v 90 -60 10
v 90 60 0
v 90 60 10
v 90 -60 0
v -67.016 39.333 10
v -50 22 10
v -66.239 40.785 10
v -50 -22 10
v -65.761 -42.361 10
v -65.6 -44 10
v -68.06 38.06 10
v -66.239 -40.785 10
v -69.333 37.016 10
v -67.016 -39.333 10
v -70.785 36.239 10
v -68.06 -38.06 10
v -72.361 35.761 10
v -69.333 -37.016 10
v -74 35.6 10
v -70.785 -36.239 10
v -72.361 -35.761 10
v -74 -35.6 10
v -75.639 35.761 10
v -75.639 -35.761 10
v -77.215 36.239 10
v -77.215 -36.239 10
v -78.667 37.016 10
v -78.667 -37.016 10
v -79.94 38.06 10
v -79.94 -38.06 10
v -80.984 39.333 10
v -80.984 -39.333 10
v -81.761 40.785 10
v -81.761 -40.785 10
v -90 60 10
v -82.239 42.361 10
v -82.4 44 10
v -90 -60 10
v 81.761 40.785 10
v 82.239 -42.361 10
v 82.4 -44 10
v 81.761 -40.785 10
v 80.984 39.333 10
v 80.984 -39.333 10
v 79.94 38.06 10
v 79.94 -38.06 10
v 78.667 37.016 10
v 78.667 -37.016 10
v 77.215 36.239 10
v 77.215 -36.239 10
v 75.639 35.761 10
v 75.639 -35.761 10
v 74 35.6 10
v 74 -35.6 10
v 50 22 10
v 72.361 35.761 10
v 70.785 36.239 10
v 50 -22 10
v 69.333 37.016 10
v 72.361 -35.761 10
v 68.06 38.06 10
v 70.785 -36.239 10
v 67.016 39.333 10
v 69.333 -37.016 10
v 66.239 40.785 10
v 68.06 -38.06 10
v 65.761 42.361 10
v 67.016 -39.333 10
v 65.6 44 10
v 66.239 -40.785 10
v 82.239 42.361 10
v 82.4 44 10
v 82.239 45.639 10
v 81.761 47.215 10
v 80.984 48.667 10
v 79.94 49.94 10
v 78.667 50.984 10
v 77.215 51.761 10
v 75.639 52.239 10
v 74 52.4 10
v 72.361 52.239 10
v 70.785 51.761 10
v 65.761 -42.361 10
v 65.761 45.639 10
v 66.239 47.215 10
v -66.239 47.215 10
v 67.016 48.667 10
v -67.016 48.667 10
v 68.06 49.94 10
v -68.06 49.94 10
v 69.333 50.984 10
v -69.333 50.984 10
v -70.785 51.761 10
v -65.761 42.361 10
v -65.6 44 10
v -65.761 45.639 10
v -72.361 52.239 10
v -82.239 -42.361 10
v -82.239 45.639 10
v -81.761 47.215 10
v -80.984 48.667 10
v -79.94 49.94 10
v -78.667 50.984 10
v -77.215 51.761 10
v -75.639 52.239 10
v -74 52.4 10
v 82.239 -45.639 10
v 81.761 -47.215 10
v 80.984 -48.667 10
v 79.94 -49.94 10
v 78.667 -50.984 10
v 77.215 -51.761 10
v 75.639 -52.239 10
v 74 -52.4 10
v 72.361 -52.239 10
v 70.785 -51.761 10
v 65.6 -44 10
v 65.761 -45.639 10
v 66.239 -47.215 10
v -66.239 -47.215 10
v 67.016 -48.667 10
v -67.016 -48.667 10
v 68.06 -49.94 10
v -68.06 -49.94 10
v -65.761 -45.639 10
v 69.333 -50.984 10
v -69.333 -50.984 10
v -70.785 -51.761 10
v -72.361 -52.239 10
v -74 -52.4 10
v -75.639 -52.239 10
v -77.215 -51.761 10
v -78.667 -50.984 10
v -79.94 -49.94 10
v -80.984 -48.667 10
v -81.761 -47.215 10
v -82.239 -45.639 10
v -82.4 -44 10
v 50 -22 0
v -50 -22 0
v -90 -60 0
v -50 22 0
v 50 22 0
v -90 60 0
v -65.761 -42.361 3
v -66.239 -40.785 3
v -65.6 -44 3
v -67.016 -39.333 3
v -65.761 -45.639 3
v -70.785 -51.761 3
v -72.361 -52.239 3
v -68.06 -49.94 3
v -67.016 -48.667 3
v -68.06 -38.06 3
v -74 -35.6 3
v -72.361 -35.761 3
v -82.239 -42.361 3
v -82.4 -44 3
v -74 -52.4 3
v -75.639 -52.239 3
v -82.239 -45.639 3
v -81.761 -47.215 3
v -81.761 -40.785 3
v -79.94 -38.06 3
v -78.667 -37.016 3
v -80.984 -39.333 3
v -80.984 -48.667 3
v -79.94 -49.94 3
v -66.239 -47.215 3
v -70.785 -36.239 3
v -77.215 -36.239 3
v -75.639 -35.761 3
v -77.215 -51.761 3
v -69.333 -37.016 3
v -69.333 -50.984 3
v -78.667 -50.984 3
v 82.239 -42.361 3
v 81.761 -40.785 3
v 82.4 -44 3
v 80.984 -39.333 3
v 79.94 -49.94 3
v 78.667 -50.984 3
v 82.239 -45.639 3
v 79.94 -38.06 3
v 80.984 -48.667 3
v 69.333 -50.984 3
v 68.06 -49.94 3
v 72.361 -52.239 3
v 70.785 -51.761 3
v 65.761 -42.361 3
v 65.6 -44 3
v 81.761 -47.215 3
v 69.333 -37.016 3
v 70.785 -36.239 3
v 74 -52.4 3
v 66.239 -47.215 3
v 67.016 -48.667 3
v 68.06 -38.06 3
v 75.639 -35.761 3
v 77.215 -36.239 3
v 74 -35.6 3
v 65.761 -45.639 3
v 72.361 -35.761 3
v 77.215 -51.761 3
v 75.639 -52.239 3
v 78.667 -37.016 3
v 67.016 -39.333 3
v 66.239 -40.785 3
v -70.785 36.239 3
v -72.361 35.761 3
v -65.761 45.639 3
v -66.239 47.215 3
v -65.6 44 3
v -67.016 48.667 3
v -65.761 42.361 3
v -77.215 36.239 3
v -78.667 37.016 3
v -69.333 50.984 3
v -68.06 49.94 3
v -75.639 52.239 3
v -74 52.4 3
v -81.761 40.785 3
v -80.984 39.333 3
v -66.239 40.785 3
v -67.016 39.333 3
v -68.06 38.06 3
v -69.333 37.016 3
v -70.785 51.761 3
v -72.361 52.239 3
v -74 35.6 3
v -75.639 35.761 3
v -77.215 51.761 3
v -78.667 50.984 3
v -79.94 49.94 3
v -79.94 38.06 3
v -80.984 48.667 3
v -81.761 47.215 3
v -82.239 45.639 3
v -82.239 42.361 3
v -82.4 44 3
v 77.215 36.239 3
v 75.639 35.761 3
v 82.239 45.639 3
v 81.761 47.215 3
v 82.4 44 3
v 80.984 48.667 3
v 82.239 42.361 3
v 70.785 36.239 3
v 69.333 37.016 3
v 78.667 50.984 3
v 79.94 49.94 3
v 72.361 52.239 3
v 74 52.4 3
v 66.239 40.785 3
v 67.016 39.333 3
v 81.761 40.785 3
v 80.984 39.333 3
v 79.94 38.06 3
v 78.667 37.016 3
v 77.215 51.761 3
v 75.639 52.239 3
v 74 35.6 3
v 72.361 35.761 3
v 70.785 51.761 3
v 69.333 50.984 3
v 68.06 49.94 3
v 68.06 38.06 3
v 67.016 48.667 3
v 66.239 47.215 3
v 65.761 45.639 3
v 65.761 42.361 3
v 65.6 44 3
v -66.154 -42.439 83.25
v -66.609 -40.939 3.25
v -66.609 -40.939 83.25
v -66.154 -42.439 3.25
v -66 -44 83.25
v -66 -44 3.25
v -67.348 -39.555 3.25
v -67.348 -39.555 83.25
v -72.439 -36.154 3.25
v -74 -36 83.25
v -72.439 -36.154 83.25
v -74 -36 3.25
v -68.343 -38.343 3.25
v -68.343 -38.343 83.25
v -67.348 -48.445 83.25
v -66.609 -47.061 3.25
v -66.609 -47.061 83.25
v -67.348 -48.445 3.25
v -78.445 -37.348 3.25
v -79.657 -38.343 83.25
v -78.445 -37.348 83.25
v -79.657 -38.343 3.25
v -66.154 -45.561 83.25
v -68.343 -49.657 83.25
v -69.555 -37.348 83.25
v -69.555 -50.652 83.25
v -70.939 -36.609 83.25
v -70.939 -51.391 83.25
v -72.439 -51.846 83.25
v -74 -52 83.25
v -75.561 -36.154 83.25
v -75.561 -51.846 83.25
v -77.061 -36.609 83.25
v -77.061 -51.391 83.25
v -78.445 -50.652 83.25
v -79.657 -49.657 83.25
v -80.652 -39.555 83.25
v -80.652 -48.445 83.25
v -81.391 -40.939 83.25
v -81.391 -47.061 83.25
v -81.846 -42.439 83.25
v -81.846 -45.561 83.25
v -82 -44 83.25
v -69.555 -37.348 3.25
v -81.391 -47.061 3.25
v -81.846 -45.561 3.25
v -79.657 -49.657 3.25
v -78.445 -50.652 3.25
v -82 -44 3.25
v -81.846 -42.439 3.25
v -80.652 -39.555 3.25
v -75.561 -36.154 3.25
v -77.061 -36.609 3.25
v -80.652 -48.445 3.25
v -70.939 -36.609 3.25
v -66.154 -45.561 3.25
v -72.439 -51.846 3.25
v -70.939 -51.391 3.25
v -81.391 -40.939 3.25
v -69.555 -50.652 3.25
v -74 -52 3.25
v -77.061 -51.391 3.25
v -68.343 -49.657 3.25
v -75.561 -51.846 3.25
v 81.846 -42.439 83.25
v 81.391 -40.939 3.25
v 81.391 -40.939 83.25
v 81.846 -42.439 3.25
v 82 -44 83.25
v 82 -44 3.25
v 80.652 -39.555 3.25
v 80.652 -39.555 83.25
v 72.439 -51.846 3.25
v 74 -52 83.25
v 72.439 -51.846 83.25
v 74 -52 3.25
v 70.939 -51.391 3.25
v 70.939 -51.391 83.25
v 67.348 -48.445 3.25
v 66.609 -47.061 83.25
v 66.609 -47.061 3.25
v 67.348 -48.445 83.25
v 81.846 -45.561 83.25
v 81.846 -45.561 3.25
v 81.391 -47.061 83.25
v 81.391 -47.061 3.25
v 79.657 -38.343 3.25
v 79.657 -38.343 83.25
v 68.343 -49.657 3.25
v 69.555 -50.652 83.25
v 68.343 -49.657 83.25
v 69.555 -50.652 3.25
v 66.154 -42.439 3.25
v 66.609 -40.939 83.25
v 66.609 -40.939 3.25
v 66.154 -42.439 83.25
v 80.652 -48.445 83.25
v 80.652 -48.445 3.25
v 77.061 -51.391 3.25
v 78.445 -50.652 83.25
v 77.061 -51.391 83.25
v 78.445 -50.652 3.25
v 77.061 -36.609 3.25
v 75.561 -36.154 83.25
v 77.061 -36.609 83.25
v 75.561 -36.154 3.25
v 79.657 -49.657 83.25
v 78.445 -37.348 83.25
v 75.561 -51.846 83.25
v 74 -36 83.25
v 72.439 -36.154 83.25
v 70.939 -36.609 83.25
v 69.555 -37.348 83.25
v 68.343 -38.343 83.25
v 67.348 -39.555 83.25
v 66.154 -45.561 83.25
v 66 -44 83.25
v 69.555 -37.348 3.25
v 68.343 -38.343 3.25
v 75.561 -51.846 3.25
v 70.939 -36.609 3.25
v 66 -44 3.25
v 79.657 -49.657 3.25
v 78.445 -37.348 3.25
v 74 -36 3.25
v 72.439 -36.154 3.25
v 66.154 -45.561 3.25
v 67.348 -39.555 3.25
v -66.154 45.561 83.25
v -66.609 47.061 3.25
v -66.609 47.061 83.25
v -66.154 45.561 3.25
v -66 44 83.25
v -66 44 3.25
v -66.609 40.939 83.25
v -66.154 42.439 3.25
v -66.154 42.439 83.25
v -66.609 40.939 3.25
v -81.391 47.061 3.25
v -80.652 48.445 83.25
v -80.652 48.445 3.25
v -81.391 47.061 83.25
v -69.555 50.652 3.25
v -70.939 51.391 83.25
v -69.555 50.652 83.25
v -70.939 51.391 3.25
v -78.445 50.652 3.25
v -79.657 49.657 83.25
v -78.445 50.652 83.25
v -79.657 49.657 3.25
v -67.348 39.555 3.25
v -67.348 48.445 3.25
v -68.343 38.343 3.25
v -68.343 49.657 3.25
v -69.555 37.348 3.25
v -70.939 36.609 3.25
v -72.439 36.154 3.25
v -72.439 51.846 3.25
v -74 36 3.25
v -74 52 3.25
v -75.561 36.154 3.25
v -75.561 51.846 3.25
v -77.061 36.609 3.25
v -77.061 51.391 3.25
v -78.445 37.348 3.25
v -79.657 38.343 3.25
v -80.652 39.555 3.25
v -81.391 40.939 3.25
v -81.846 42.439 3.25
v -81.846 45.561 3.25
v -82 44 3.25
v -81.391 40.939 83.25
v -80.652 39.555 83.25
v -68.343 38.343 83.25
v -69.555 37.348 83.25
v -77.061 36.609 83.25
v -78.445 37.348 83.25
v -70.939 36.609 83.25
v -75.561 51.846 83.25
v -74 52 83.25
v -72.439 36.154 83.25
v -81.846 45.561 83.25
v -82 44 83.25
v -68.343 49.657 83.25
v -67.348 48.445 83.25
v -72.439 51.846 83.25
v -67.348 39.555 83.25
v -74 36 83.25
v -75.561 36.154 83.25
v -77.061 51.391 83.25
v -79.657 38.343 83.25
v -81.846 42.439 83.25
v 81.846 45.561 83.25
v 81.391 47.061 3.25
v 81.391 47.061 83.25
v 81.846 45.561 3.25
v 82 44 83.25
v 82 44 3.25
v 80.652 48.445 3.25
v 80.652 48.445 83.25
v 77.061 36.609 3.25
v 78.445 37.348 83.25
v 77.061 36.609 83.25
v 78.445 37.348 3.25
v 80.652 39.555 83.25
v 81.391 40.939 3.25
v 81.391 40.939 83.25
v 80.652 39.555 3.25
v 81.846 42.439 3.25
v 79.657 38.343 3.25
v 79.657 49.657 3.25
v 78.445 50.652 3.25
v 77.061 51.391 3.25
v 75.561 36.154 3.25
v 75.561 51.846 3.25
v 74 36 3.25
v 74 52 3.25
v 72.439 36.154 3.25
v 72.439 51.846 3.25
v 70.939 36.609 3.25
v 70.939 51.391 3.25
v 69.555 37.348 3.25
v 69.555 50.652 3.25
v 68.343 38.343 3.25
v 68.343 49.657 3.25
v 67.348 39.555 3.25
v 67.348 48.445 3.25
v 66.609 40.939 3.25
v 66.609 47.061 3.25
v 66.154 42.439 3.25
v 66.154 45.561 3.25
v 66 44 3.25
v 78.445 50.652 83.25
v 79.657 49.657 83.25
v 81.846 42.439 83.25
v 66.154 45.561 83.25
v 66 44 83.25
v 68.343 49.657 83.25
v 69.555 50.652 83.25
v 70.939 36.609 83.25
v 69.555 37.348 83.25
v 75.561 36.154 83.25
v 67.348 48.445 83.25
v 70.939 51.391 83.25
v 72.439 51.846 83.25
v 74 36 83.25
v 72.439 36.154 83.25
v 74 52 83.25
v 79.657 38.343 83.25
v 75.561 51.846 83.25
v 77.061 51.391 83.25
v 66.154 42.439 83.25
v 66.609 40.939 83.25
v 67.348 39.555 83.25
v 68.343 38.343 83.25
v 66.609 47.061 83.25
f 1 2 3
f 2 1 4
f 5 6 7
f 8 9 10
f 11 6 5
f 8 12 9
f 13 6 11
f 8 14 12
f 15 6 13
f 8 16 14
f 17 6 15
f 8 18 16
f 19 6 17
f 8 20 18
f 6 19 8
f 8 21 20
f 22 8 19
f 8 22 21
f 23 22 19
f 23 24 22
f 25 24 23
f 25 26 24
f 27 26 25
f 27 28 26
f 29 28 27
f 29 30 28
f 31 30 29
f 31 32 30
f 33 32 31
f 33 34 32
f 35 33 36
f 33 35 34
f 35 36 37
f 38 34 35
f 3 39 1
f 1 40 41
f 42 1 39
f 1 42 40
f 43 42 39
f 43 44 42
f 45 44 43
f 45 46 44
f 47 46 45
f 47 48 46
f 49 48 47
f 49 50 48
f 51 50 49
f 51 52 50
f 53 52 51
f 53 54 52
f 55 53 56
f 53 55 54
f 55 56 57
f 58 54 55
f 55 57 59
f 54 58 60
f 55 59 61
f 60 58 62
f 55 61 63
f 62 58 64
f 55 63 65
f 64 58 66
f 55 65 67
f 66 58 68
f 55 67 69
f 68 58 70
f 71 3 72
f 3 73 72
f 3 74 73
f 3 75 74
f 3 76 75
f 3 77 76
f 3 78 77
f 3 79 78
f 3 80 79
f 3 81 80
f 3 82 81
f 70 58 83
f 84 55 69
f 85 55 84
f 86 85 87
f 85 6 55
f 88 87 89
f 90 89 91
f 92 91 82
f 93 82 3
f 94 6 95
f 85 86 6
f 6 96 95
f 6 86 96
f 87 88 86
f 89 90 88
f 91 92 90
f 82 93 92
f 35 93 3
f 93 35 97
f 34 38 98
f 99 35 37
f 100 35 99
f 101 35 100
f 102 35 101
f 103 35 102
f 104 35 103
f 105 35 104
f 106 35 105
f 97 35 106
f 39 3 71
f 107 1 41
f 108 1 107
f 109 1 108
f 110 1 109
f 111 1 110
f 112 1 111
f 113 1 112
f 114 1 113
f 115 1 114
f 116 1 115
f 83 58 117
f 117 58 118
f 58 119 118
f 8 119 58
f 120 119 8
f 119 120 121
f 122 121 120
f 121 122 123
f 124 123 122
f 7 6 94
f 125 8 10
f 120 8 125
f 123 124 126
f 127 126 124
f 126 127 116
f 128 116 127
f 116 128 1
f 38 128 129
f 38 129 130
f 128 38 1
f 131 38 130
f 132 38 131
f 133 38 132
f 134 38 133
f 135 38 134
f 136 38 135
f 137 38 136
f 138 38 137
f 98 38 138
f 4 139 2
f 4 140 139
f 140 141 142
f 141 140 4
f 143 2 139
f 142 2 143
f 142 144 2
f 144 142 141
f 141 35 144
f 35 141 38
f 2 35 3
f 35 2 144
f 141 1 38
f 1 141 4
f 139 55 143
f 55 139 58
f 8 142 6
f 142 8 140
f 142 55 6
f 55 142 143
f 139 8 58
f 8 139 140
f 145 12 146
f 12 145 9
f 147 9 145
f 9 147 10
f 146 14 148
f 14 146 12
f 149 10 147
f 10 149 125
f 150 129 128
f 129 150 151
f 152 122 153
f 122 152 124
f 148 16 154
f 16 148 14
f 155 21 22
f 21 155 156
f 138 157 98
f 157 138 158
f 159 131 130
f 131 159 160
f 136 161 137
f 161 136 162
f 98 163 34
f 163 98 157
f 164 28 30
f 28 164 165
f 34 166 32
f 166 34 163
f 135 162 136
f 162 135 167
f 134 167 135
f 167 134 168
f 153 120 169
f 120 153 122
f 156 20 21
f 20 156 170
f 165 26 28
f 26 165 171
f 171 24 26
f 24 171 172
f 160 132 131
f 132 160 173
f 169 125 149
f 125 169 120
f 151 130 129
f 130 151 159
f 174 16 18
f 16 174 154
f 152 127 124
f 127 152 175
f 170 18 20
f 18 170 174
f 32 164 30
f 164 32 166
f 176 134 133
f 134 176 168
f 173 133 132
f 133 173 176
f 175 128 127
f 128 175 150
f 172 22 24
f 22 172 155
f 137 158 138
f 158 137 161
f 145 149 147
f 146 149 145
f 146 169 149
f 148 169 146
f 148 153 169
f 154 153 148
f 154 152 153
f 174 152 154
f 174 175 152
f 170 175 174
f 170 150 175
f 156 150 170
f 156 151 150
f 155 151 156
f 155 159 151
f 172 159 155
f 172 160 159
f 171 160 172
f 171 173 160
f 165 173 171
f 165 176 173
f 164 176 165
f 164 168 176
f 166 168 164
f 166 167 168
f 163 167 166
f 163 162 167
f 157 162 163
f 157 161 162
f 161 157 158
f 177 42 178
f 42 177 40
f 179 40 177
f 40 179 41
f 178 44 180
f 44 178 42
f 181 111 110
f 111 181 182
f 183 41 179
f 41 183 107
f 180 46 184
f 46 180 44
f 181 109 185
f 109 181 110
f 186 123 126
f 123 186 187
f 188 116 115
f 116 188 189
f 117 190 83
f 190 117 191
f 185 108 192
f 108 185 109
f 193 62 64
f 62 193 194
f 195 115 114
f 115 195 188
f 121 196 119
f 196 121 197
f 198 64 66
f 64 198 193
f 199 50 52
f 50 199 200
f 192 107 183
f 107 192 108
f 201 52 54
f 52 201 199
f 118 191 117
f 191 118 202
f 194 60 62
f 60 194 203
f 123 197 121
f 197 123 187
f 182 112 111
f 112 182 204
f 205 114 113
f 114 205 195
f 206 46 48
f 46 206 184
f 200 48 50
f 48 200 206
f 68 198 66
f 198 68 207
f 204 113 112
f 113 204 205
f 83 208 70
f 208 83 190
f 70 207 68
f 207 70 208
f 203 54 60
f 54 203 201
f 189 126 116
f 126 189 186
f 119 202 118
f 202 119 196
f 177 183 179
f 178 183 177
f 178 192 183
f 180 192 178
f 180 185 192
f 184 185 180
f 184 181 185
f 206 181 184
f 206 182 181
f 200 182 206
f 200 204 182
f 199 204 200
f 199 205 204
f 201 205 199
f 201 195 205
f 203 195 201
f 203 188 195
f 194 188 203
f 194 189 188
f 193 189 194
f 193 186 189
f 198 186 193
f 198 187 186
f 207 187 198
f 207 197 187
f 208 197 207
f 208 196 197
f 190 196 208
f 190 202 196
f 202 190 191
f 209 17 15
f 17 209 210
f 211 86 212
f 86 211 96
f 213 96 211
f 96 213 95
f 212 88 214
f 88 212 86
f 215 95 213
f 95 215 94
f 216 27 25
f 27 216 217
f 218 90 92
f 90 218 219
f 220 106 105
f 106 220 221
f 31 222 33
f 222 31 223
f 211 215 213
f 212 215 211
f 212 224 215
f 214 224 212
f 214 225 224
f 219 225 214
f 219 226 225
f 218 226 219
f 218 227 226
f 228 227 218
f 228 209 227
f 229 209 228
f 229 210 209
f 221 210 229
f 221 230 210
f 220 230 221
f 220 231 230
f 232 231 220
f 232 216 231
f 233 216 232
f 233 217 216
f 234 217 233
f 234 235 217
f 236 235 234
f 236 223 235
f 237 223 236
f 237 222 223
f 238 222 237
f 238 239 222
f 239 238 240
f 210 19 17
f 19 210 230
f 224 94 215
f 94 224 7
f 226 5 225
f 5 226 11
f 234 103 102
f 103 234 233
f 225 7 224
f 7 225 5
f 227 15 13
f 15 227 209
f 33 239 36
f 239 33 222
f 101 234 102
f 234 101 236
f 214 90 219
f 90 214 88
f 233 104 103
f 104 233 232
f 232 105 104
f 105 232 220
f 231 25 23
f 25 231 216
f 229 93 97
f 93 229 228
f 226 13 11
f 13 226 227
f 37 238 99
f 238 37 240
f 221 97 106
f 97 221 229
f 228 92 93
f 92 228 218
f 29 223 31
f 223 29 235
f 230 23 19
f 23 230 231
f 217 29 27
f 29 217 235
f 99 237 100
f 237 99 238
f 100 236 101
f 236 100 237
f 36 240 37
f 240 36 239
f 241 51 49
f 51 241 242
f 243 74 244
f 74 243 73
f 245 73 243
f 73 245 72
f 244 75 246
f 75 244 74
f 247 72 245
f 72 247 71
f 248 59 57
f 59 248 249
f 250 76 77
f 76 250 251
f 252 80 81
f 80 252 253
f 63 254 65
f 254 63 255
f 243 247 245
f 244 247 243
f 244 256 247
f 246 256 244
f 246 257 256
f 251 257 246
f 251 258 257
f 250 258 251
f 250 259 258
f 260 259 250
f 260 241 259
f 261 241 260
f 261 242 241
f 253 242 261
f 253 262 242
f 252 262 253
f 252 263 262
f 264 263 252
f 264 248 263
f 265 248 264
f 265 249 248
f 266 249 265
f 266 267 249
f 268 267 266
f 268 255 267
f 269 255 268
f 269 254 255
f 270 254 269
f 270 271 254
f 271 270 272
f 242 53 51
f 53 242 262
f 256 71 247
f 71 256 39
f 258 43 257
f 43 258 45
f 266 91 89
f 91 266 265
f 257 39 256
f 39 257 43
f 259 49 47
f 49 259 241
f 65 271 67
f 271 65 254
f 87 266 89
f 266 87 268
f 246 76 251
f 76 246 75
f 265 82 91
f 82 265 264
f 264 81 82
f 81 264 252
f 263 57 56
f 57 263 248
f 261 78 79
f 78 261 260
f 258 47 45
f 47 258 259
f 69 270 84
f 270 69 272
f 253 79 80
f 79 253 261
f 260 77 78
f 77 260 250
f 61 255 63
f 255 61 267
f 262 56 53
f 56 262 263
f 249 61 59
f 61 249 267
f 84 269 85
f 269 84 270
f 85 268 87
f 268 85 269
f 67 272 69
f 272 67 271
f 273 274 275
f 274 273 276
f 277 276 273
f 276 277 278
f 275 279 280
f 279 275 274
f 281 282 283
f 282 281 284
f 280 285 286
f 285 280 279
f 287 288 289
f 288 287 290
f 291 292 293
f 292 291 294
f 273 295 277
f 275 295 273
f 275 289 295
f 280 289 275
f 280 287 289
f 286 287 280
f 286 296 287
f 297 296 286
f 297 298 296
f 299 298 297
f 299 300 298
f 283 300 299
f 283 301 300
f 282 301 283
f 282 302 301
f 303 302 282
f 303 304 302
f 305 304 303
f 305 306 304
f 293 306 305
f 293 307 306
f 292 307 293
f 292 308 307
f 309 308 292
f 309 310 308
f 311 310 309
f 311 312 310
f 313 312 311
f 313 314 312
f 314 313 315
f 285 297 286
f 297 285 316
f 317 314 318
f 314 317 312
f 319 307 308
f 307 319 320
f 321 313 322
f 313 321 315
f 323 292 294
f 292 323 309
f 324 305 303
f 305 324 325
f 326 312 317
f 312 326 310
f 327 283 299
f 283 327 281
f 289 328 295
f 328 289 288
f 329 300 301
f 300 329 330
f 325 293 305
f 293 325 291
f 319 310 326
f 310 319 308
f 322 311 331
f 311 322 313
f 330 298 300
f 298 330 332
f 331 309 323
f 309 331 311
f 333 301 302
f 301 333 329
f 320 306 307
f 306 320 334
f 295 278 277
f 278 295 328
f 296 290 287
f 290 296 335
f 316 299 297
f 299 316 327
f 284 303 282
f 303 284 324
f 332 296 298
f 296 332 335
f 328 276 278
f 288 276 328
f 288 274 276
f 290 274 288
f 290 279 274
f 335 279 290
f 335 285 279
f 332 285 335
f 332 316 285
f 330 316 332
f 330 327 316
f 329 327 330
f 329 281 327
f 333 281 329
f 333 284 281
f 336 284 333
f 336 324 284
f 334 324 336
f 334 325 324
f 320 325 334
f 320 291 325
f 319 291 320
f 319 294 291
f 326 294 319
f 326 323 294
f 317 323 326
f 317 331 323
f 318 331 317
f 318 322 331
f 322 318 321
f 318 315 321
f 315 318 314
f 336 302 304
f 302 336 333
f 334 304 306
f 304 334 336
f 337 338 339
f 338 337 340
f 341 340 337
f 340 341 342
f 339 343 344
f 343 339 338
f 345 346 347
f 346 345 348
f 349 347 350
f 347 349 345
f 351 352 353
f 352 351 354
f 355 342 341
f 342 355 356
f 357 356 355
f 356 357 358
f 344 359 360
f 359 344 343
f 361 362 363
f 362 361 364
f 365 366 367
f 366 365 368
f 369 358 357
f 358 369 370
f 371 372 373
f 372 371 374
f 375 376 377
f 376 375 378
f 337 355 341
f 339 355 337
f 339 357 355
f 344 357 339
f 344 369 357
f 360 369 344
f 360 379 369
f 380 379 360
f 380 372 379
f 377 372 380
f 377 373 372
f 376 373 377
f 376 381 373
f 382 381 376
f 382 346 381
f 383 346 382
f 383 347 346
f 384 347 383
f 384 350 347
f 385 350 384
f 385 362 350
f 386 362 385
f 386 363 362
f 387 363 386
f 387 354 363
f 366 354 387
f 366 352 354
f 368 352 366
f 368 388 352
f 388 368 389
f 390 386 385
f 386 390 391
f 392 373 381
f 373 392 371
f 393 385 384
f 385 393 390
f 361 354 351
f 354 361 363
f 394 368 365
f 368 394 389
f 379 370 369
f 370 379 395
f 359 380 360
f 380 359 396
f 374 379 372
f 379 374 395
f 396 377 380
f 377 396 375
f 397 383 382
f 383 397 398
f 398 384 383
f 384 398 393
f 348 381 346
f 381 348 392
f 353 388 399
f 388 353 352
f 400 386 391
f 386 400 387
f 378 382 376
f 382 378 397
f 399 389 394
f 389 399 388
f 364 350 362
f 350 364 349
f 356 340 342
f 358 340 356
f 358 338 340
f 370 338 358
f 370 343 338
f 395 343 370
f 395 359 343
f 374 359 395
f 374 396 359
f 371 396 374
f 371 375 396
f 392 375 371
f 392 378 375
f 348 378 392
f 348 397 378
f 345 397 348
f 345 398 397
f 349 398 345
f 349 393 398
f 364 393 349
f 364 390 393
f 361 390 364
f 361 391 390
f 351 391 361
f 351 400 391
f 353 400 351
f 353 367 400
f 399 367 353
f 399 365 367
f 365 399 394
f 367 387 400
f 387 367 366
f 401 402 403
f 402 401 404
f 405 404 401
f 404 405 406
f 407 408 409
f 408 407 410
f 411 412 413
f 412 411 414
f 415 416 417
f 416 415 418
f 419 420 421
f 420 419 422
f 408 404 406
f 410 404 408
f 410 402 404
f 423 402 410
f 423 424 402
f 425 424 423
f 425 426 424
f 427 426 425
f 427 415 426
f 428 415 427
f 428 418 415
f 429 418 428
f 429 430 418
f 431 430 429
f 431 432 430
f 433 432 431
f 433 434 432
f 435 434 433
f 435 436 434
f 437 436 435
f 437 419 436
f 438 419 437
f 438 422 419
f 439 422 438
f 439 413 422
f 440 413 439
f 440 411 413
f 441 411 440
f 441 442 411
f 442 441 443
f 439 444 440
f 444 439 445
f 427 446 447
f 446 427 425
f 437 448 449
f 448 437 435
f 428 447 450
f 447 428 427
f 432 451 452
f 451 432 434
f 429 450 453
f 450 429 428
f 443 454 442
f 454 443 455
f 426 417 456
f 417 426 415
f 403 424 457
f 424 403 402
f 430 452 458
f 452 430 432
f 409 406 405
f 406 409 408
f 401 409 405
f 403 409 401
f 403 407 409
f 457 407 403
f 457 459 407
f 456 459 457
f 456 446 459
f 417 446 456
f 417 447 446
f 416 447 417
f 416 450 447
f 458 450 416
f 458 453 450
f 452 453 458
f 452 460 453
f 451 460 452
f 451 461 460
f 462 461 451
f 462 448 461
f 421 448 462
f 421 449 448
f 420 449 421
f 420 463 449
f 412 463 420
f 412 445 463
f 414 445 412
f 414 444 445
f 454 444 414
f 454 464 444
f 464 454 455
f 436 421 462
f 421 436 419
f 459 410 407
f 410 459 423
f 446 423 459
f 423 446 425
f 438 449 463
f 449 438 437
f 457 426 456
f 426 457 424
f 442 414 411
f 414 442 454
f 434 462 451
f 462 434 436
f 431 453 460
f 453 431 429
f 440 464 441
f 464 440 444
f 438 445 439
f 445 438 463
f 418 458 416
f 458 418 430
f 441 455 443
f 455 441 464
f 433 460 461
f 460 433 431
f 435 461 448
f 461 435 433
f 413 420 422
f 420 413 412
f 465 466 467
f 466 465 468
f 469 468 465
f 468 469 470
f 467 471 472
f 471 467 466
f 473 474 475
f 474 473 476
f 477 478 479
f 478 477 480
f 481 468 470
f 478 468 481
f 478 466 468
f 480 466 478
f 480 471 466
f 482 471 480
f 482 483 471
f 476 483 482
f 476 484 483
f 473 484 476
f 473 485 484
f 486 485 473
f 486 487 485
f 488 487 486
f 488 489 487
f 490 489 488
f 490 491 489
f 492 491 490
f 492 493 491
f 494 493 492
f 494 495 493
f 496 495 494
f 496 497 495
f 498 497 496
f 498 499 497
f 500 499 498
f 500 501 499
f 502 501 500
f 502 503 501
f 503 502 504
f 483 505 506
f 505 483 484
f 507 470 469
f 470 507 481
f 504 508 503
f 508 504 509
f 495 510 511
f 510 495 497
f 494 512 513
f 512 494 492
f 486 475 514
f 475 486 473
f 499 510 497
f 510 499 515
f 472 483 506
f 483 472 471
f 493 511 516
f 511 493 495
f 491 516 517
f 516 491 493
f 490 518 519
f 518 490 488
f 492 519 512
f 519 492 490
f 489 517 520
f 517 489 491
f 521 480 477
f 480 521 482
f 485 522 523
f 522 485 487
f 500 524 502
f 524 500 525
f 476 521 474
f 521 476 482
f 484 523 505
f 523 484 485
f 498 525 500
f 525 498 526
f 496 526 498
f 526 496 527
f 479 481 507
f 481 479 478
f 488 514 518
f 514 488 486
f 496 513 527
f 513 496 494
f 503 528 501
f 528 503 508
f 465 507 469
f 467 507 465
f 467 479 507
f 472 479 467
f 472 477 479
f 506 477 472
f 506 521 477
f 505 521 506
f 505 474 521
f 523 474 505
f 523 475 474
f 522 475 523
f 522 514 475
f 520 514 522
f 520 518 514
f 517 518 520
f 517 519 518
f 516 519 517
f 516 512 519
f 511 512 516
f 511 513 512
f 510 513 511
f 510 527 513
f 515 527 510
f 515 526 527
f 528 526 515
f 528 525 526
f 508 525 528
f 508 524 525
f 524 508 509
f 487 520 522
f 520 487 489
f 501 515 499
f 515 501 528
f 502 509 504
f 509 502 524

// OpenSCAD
$fn = 32;

// ------------------------------------------------------------------------
// Frame with four posts: 180 x 120 mm frame, four d16 posts
// Every part is its own module, assembly() places them once.
// ------------------------------------------------------------------------

// --- part 1 ---
module base_frame() {
  difference() {
    translate([-90, -60, 0]) cube([180, 120, 10]);
    translate([-50, -22, -1]) cube([100, 44, 12]);
    translate([-74, -44, 3]) cylinder(h = 8, d = 16.8);
    translate([74, -44, 3]) cylinder(h = 8, d = 16.8);
    translate([-74, 44, 3]) cylinder(h = 8, d = 16.8);
    translate([74, 44, 3]) cylinder(h = 8, d = 16.8);
  }
}

// --- part 2 ---
module post1() {
  cylinder(h = 80, d = 16);
}

// --- part 3 ---
module post2() {
  cylinder(h = 80, d = 16);
}

// --- part 4 ---
module post3() {
  cylinder(h = 80, d = 16);
}

// --- part 5 ---
module post4() {
  cylinder(h = 80, d = 16);
}

// --- assembly ---
module assembly() {
  translate([0, 0, 0]) rotate([0, 0, 0]) base_frame();
  translate([-74, -44, 3.25]) rotate([0, 0, 0]) post1();
  translate([74, -44, 3.25]) rotate([0, 0, 0]) post2();
  translate([-74, 44, 3.25]) rotate([0, 0, 0]) post3();
  translate([74, 44, 3.25]) rotate([0, 0, 0]) post4();
}

assembly();
